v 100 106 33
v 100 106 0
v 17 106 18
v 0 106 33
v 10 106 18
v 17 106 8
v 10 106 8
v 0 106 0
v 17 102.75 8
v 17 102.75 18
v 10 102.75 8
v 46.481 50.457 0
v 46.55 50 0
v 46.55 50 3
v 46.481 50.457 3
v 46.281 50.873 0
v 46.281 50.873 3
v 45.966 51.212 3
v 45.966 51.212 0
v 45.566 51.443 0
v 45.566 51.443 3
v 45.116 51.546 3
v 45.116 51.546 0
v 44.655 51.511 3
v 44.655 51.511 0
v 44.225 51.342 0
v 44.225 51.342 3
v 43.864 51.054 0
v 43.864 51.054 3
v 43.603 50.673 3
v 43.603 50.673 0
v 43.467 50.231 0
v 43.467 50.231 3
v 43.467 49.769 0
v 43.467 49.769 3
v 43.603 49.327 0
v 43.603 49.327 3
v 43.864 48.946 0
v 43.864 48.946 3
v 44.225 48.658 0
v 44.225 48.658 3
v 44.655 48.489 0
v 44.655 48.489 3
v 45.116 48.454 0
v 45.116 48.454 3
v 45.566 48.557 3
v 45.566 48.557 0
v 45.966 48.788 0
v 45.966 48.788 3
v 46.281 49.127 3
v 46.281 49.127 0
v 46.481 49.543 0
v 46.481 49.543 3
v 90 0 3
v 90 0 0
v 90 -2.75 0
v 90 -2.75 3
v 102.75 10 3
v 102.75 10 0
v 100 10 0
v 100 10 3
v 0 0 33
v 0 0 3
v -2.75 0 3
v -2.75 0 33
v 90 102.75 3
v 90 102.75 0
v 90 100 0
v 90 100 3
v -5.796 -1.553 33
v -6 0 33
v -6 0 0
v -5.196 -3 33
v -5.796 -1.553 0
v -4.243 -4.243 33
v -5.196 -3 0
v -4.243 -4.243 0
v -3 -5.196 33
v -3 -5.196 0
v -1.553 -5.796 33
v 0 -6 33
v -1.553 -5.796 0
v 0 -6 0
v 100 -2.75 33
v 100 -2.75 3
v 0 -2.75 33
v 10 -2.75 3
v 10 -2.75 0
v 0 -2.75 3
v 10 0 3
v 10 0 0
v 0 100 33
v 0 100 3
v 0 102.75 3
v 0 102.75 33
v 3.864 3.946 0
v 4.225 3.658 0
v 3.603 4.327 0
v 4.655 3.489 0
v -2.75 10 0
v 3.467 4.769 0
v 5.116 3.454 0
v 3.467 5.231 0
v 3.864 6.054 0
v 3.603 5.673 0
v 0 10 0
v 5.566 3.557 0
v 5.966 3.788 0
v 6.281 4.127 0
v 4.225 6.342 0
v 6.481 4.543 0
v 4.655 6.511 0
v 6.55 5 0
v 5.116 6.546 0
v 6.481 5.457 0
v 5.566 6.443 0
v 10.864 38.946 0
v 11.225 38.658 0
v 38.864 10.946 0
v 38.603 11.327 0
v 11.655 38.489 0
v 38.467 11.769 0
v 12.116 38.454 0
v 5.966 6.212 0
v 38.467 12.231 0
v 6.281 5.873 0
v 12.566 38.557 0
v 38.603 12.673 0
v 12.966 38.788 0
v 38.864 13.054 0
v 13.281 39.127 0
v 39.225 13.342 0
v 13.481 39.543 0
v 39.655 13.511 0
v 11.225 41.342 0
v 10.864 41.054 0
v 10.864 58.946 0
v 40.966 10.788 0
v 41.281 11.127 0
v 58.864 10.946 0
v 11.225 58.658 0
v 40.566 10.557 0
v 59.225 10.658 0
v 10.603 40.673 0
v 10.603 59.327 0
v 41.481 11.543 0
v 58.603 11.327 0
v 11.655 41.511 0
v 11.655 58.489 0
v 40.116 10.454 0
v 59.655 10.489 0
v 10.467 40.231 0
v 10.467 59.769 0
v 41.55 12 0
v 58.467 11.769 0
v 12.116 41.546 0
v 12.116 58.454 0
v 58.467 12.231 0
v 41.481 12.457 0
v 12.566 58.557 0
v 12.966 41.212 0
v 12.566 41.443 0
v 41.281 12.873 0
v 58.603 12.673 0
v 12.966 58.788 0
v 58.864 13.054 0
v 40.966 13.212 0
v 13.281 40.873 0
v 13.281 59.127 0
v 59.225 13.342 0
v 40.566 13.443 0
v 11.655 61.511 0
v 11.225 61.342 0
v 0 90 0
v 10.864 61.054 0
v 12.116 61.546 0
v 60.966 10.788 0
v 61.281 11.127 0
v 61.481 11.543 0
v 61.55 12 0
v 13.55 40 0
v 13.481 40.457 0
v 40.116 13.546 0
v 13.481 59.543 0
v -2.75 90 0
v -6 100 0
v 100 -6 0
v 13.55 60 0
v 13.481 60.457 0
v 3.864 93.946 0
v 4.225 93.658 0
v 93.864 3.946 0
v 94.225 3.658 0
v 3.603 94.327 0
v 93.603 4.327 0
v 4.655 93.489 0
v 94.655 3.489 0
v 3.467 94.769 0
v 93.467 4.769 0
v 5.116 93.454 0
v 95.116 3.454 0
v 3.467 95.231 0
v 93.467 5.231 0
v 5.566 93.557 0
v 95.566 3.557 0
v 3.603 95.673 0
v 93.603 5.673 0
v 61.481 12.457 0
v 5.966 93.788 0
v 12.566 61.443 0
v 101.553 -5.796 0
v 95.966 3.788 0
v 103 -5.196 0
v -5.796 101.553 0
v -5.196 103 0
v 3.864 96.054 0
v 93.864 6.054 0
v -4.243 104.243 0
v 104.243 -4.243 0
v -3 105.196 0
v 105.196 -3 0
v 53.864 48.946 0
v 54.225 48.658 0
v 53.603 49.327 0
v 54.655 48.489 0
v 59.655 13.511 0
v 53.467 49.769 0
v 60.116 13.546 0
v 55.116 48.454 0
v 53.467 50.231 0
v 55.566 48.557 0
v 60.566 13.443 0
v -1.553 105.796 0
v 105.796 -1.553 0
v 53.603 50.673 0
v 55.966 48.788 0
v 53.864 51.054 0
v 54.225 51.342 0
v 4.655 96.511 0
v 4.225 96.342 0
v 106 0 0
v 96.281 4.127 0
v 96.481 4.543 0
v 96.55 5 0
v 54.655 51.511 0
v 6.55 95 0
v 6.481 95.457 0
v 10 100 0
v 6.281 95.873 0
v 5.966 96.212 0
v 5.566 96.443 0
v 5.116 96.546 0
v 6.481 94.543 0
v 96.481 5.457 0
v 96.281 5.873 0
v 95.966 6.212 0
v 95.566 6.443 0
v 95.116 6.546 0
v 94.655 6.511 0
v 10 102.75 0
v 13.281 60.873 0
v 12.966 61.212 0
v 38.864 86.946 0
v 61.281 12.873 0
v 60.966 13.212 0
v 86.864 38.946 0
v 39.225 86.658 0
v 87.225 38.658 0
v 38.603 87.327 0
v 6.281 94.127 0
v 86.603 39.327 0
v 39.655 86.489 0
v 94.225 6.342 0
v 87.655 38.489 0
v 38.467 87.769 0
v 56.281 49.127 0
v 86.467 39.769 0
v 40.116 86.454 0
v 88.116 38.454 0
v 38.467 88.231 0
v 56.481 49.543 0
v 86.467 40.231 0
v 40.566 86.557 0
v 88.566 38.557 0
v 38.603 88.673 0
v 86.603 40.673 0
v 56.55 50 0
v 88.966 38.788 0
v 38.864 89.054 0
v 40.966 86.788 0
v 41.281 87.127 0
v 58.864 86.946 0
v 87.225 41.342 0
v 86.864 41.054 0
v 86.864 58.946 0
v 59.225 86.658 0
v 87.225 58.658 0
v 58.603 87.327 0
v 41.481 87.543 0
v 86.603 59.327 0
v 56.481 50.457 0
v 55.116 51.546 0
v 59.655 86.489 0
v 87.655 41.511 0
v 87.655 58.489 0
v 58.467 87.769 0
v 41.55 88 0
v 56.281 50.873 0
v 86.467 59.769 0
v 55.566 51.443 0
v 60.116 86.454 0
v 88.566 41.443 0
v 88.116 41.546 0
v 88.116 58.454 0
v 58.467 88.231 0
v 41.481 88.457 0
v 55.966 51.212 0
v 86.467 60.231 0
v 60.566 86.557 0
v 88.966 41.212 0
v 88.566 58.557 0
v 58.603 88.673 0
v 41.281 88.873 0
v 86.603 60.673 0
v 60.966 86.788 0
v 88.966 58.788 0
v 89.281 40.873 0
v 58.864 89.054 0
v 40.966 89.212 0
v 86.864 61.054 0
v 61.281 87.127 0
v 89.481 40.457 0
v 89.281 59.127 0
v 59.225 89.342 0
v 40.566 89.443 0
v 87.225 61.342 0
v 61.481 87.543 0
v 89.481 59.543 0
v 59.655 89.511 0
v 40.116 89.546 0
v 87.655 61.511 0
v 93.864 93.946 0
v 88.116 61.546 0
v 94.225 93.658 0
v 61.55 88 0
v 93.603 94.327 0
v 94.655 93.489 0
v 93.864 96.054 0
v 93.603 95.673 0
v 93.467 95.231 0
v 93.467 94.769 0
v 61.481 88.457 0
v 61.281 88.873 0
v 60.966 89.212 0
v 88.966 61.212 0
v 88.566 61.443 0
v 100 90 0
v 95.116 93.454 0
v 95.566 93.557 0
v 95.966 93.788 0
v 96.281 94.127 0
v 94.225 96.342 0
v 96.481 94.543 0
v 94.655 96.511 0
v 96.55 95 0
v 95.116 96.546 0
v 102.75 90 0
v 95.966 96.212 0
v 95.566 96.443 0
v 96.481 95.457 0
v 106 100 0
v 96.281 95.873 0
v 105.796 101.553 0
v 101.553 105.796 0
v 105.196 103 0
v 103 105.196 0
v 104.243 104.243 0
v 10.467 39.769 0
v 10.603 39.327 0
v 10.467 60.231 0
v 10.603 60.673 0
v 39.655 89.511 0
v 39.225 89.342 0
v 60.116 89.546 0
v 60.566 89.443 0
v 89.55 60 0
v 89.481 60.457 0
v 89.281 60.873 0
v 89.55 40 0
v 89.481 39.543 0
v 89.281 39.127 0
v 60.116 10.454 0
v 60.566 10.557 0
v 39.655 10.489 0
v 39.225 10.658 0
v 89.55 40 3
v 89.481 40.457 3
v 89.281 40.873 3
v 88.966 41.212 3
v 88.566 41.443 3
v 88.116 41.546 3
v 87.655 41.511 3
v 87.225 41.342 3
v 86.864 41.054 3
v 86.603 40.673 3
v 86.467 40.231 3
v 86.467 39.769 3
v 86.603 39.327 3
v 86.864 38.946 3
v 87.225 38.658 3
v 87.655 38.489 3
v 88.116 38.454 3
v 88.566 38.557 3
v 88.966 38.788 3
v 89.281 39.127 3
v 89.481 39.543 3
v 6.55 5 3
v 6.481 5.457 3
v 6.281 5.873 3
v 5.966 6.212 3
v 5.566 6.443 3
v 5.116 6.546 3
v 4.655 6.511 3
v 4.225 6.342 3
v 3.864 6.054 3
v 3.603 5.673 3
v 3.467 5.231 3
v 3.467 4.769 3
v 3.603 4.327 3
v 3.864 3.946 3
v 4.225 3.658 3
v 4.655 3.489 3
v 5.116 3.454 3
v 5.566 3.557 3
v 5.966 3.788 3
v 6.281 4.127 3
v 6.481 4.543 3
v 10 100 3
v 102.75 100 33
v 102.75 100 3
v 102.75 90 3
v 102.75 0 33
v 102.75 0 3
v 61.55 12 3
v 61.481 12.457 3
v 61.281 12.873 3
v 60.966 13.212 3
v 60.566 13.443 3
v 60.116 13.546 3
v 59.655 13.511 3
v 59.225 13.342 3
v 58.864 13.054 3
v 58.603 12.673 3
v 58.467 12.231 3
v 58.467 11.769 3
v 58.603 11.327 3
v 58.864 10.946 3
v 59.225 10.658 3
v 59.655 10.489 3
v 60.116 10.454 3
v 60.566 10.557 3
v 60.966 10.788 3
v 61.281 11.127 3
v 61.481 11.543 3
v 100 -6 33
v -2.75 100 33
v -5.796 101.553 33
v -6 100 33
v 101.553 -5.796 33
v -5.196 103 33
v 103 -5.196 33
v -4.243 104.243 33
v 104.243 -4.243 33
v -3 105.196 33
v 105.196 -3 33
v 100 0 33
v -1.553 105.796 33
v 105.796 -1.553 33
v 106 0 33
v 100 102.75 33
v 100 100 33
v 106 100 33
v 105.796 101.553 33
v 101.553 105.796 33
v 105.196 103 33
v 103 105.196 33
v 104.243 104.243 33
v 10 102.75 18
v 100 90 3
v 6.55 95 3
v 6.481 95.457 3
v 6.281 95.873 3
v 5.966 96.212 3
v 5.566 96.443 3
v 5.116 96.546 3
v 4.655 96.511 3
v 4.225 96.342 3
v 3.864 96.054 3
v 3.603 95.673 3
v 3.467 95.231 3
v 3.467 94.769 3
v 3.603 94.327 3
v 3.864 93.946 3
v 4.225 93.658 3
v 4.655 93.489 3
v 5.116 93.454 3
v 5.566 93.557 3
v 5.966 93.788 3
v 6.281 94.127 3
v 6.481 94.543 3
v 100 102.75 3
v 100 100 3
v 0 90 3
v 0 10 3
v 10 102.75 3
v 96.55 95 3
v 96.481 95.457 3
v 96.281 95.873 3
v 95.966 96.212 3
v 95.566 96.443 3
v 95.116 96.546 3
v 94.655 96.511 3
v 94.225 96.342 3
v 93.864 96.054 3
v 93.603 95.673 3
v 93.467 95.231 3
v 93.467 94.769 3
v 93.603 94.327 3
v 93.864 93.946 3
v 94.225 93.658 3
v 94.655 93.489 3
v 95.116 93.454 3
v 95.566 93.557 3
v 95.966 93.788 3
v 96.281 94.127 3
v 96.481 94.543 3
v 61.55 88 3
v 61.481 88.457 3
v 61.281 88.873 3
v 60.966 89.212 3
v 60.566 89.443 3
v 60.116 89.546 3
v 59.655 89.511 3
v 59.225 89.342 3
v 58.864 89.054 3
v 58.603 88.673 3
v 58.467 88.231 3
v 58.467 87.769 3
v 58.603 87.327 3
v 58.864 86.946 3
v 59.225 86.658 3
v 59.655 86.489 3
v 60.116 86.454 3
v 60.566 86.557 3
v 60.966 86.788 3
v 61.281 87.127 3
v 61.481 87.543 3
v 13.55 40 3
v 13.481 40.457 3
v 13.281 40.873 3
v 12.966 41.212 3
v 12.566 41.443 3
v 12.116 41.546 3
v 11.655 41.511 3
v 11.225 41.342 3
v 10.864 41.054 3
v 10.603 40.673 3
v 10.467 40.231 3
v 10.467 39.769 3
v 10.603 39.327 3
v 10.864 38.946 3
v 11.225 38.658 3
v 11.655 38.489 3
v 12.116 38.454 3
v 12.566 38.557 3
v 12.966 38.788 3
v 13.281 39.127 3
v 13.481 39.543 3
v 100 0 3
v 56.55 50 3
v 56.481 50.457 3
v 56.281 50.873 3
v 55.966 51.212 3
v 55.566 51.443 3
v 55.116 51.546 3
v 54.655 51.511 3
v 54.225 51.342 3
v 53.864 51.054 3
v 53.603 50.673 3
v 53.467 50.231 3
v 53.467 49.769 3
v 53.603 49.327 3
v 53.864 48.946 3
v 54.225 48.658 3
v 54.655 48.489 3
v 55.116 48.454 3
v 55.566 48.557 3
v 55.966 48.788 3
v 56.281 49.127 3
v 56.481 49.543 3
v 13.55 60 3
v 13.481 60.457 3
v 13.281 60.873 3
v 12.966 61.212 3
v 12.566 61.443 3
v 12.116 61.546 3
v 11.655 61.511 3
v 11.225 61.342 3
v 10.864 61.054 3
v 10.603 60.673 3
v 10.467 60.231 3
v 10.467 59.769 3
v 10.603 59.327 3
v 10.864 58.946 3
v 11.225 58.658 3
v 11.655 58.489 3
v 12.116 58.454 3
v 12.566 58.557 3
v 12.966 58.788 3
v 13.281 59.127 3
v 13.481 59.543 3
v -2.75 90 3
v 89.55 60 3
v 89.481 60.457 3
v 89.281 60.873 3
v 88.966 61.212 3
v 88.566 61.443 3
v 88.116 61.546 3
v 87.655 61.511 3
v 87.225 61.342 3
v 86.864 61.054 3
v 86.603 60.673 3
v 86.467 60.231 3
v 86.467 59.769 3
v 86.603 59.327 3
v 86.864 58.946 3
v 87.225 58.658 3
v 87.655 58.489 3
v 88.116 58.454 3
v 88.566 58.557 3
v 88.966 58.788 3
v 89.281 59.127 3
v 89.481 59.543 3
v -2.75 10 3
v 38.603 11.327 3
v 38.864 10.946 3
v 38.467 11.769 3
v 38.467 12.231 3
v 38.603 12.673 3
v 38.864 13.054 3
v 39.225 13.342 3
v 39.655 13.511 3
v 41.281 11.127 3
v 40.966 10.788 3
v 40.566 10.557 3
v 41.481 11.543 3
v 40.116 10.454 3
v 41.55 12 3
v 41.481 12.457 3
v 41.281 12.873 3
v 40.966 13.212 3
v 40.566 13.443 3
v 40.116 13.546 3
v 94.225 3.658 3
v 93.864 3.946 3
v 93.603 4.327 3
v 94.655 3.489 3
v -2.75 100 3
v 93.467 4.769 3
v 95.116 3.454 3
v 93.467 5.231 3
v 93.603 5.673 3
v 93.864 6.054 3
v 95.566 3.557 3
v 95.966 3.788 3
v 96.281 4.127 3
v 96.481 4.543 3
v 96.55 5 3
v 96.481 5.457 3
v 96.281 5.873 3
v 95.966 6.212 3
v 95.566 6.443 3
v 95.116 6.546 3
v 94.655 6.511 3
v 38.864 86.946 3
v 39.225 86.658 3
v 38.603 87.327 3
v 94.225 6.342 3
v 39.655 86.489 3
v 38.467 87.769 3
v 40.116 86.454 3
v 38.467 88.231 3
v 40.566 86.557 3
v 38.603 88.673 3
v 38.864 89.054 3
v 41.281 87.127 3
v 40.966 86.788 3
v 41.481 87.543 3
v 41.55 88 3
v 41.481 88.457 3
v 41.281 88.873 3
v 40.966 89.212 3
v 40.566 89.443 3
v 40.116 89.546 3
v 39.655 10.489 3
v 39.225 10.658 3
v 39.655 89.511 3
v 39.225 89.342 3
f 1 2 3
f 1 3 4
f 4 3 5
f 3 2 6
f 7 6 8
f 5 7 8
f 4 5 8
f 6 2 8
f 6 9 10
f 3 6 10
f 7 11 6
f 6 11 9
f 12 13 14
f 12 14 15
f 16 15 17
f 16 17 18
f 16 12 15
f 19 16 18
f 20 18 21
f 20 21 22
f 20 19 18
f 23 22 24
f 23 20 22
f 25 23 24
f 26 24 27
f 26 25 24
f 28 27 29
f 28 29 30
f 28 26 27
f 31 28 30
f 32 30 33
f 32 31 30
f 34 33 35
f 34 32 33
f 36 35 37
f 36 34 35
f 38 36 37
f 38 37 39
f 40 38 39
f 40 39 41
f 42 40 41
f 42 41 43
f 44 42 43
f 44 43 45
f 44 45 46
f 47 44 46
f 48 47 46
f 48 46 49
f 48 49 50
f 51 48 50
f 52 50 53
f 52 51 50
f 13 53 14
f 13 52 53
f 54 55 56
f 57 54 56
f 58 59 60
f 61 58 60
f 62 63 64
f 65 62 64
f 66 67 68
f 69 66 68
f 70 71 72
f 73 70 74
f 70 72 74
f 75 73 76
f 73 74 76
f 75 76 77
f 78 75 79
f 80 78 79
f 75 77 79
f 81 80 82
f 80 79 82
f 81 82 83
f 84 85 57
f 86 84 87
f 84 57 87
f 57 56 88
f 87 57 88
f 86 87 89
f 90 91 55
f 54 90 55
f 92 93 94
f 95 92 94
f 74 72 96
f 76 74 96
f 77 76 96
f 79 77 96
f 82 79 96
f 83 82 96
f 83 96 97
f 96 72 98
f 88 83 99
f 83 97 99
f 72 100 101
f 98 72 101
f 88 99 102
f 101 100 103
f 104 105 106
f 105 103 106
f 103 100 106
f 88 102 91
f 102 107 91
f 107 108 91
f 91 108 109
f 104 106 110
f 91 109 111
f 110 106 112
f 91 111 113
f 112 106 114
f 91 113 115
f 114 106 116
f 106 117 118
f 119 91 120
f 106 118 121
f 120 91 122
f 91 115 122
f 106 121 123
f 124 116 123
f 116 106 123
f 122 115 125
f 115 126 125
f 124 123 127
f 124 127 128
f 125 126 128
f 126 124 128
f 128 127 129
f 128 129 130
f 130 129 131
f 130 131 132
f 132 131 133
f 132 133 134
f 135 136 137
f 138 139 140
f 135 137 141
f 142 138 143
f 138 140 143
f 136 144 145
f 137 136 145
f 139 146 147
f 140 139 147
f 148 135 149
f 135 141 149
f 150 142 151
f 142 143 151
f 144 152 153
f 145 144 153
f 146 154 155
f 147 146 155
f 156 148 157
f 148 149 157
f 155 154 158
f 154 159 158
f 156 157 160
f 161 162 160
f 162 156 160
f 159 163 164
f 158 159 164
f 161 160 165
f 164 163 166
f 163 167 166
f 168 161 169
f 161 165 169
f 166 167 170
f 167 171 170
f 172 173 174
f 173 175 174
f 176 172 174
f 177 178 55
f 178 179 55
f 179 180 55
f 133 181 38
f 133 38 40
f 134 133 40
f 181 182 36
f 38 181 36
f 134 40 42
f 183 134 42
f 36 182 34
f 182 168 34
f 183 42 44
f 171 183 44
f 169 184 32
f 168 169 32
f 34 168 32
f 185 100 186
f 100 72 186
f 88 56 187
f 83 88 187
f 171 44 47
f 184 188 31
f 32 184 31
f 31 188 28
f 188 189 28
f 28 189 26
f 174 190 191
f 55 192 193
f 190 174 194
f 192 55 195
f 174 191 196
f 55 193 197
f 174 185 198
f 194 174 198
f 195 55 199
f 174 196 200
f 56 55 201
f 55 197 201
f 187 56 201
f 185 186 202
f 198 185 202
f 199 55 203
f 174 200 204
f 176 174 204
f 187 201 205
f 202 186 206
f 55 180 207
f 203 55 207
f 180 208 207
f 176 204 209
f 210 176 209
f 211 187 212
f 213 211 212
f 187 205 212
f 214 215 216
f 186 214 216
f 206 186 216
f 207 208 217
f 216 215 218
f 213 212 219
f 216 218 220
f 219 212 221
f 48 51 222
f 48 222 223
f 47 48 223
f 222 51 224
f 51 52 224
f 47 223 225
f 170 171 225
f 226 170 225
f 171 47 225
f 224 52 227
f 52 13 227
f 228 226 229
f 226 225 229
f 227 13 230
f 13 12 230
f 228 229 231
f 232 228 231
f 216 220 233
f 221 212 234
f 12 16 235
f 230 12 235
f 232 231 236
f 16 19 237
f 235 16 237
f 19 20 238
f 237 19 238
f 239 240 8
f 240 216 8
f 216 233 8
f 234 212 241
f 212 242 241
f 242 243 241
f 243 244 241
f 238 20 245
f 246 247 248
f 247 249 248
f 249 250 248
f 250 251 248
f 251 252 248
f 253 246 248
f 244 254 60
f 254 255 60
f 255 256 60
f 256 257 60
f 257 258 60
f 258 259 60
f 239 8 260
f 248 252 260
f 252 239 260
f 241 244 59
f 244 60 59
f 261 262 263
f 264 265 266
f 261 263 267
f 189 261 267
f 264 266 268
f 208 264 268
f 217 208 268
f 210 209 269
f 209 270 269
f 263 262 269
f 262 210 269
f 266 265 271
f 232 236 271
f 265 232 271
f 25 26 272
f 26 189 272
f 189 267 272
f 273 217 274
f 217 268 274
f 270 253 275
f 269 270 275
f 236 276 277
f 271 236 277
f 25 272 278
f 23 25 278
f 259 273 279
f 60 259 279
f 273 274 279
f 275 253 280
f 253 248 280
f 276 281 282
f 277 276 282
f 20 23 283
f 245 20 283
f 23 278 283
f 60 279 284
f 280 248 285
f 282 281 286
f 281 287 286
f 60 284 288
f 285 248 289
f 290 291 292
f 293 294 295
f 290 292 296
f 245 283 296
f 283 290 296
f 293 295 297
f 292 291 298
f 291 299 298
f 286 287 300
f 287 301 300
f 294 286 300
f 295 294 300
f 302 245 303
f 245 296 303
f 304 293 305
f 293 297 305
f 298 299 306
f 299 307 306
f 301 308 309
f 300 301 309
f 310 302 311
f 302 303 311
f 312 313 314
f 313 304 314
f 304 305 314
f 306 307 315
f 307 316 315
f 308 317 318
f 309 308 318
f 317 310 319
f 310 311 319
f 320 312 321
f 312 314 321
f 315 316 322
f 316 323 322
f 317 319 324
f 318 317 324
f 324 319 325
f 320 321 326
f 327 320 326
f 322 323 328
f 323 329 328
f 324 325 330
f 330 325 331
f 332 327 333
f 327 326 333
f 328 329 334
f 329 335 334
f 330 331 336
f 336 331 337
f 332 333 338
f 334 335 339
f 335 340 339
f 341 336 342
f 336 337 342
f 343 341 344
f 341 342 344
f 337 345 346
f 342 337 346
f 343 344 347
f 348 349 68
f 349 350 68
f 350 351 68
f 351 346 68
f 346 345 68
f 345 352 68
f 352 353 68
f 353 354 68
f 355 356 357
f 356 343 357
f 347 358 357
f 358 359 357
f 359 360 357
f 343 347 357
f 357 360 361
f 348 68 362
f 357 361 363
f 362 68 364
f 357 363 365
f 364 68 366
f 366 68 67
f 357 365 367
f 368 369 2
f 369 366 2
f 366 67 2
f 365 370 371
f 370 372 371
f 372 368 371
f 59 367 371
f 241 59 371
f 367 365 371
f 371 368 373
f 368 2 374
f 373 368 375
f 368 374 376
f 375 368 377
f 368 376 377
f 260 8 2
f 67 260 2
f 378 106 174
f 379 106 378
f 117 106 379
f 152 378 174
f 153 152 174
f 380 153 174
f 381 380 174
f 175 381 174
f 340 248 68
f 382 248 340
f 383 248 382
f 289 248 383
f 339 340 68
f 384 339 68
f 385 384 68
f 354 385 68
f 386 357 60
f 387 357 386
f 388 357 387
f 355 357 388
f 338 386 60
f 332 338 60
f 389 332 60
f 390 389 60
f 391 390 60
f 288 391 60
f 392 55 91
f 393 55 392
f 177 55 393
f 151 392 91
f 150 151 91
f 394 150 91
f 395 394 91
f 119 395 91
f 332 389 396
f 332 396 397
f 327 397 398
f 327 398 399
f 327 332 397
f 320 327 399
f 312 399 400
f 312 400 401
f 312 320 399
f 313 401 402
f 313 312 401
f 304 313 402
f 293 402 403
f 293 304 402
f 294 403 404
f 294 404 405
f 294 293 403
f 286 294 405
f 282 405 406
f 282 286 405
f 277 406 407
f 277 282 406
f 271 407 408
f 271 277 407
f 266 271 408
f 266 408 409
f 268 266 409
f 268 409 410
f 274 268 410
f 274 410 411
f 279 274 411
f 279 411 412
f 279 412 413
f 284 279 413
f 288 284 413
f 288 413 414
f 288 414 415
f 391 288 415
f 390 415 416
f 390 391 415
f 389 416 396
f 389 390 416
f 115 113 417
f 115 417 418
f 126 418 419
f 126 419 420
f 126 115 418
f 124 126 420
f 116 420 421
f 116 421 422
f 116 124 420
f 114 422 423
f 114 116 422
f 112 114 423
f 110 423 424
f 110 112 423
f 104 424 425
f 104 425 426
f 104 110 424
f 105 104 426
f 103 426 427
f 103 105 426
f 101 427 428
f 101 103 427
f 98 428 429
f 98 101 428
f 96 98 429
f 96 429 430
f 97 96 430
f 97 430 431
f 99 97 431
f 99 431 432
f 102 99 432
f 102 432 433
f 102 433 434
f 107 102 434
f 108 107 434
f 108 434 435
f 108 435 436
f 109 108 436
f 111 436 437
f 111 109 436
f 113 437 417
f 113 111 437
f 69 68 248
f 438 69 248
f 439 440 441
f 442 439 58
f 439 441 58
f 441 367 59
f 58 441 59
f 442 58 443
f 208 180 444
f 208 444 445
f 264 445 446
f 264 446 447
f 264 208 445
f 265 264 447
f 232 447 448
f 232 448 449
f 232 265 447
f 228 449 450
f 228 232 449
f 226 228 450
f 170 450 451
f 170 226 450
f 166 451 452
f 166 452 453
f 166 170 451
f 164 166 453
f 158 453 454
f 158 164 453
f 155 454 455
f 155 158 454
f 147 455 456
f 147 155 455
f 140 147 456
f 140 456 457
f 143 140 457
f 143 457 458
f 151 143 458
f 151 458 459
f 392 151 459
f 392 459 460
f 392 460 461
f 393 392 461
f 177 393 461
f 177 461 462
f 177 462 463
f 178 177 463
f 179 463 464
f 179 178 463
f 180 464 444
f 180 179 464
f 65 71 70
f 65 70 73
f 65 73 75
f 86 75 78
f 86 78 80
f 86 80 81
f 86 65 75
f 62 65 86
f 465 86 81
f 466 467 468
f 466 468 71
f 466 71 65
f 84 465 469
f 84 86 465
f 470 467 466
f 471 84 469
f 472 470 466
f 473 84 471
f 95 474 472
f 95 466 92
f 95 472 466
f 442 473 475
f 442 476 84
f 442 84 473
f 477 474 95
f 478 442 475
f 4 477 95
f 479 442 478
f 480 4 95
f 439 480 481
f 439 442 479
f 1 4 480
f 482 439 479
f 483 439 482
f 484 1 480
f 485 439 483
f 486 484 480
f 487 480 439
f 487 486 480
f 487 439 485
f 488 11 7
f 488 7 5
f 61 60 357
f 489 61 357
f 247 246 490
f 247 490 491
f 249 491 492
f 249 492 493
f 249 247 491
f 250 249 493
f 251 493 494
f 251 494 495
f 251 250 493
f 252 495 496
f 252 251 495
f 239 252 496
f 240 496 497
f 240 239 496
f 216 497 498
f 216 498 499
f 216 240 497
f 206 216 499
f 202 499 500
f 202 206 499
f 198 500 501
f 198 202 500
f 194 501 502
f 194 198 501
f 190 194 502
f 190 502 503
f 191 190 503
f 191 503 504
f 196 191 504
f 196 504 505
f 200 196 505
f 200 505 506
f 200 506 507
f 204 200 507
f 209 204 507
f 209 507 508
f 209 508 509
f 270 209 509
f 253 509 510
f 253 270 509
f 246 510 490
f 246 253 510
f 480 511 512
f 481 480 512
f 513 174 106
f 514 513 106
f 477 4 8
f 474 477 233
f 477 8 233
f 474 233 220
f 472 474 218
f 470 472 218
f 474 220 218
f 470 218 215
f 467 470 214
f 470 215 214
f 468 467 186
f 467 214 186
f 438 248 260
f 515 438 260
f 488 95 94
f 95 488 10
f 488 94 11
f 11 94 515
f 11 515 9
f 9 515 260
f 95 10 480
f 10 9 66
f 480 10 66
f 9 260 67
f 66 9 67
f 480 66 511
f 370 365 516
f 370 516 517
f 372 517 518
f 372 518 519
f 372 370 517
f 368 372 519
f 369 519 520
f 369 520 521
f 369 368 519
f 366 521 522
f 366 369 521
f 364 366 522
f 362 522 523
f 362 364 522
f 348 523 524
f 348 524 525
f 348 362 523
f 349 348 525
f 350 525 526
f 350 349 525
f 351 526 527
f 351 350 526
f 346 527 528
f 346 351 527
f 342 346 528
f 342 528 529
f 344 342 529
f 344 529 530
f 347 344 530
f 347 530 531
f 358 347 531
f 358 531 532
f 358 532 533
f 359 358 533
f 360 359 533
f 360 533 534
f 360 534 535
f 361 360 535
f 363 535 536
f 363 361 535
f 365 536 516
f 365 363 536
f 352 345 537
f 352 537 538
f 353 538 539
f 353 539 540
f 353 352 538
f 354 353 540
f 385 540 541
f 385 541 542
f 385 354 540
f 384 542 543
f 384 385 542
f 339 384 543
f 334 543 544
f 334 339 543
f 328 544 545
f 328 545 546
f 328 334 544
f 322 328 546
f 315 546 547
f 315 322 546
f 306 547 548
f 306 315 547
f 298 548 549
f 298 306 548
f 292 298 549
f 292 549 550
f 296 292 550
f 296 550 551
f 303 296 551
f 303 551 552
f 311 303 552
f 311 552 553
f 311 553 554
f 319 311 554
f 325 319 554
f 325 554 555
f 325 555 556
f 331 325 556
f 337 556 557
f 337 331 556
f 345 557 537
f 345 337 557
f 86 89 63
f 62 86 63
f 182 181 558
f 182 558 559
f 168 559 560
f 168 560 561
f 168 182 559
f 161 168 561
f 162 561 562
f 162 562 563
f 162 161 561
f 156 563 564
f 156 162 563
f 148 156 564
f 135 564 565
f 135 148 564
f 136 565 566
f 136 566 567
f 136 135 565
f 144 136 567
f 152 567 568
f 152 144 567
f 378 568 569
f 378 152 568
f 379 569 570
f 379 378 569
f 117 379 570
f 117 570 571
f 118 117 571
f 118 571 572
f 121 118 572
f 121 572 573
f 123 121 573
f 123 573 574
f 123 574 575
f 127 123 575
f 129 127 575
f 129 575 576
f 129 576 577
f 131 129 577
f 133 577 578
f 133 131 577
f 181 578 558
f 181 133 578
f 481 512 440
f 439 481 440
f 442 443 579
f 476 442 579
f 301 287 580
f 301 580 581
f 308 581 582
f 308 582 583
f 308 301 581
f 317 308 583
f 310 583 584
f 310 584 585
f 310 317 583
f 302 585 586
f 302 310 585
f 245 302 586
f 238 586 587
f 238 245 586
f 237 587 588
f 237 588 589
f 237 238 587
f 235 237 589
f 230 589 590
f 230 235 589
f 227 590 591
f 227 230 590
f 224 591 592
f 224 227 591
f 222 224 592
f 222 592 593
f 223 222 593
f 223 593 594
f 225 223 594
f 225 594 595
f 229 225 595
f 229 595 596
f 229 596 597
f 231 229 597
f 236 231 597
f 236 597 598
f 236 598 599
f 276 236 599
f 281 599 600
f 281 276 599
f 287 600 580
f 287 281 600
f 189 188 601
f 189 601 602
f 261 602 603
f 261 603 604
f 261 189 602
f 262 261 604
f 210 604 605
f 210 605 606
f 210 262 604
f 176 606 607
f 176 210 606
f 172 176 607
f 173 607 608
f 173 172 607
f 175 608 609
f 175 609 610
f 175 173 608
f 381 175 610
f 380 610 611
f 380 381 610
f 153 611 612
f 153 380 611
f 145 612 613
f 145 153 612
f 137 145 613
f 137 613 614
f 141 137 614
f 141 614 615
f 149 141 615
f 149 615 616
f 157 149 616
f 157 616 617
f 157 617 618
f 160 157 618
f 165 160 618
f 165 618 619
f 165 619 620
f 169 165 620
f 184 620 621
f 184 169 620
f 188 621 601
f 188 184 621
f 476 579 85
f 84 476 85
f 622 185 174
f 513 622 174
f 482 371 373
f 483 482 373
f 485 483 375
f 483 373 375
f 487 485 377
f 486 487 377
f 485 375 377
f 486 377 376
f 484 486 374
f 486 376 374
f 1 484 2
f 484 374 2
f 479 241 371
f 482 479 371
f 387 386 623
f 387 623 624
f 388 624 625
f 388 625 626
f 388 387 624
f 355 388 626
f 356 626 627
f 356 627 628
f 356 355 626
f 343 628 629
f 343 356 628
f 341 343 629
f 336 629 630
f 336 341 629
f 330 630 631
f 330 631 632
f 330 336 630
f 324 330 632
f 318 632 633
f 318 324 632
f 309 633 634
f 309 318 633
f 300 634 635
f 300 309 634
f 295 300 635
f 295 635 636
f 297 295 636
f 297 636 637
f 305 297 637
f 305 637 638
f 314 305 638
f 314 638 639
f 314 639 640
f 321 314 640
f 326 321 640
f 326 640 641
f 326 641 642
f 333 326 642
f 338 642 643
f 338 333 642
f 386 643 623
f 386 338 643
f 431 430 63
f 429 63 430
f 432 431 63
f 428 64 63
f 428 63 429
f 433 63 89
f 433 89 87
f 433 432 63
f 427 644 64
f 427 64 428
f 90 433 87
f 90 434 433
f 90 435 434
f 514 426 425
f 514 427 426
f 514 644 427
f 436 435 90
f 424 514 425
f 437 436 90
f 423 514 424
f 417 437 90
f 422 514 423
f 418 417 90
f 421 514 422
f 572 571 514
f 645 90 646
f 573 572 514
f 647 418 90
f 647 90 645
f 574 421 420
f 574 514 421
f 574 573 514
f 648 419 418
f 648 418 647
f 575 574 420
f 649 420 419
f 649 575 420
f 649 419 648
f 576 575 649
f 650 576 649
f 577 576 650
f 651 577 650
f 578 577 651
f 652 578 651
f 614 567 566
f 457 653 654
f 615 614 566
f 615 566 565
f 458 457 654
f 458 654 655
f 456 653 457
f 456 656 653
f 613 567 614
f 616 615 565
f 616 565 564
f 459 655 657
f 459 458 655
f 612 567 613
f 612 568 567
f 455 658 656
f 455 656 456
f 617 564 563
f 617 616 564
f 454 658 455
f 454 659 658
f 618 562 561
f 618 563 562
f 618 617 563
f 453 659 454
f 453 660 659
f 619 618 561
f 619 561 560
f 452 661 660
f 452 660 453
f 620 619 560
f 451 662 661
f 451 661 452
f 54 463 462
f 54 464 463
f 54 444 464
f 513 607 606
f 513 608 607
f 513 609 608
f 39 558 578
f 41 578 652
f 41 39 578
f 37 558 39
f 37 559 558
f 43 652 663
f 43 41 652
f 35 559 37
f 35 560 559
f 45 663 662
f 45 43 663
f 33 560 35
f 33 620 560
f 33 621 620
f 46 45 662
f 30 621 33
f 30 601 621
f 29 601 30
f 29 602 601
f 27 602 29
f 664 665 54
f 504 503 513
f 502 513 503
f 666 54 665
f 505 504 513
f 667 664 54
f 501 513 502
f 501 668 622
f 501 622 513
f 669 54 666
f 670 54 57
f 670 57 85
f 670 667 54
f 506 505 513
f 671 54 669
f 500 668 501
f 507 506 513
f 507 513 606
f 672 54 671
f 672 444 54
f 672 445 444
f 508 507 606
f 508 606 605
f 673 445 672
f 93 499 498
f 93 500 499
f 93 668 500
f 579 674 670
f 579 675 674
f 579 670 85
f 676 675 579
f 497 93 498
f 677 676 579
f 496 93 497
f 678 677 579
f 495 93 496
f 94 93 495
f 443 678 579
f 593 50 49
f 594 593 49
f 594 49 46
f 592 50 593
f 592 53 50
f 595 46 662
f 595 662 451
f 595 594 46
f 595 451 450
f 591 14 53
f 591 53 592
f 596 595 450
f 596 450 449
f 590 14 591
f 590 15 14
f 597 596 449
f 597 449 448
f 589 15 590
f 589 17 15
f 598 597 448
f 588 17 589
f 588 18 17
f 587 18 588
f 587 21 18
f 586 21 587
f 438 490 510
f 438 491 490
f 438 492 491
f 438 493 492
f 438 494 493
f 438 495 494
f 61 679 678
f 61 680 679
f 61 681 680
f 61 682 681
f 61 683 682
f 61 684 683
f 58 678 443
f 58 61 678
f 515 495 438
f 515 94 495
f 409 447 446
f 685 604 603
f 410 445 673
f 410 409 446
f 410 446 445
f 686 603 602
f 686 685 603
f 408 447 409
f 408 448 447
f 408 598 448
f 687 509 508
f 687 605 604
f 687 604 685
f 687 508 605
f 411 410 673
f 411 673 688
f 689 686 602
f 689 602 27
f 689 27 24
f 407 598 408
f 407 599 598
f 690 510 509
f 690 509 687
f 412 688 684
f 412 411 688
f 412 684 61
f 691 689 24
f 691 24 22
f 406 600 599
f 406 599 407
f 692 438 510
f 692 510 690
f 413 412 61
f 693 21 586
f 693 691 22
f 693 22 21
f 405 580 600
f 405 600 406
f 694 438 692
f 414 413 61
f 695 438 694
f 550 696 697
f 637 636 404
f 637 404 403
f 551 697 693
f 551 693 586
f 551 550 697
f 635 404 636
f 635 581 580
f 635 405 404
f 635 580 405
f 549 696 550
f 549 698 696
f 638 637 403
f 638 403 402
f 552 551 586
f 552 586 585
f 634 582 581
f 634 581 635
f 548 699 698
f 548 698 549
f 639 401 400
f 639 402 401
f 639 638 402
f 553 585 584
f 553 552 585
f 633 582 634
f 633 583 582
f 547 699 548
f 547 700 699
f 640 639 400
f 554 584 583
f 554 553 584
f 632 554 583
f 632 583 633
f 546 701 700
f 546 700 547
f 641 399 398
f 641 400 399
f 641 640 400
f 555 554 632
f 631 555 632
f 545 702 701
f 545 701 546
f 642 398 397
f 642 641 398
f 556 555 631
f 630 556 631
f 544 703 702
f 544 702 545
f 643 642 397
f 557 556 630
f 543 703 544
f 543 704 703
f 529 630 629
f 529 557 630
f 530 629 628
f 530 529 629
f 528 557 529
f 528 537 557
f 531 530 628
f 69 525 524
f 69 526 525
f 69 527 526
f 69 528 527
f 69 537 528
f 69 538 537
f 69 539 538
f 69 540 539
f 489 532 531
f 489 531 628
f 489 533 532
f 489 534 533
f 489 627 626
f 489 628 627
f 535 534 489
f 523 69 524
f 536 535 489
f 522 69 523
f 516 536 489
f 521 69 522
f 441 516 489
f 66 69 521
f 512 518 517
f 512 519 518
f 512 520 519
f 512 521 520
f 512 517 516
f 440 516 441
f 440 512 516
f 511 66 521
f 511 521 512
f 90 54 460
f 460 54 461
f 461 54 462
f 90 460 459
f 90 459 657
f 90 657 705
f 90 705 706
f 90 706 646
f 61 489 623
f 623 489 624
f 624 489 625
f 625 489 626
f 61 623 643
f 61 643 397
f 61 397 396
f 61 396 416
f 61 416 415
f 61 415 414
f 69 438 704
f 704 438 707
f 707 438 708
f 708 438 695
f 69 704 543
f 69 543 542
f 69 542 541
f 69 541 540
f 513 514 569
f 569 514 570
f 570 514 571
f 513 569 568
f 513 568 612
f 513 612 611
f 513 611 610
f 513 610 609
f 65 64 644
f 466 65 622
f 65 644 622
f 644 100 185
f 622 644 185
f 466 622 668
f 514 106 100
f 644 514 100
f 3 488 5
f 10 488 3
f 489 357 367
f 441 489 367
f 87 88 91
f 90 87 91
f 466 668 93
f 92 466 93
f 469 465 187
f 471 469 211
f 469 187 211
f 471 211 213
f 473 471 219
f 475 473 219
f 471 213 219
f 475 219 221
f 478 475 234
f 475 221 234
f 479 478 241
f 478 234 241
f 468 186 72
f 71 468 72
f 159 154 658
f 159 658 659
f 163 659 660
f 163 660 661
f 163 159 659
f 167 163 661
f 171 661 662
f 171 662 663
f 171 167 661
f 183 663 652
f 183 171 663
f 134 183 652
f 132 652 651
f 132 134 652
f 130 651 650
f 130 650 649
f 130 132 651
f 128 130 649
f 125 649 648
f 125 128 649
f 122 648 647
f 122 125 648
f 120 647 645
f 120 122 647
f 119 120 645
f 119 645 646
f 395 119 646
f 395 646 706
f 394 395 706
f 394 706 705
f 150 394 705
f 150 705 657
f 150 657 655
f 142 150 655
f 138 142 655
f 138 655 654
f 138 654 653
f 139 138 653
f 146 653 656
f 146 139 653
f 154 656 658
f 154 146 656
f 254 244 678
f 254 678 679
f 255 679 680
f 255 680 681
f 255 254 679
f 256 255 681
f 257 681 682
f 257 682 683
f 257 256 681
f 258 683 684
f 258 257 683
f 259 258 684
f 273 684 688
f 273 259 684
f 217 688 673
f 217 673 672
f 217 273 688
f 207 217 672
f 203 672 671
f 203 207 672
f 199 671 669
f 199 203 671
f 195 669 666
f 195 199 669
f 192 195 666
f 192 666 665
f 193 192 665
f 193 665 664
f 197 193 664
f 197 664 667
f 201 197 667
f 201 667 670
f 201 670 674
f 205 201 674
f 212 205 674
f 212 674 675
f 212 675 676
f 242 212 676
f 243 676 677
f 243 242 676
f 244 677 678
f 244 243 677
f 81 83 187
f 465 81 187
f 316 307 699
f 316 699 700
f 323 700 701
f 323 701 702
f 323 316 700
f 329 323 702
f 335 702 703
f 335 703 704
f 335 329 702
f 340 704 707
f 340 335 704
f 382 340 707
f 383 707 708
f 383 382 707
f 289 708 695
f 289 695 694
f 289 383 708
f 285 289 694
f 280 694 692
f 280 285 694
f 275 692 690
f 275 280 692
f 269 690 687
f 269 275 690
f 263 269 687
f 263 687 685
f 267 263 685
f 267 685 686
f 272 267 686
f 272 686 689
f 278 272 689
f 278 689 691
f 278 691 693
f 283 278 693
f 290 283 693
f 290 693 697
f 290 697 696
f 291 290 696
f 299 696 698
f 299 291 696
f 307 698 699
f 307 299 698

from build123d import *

# Parameters (mm, degrees)
SKETCH_1_R          = 1.55
EXTRUDE_4_DEPTH     = 3
EXTRUDE_5_DEPTH     = 33
SKETCH_3_W          = 7
SKETCH_3_H          = 10
CUT_EXTRUDE_1_DEPTH = 6


with BuildPart() as part:
    # 草图1 → 凸台-拉伸4 (new body)
    with BuildSketch(Plane.XY):
        Polygon((0, 10), (-2.75, 10), (-2.75, 0), (0, 0), (0, -2.75), (10, -2.75), (10, 0), (50, 0), (90, 0), (90, -2.75), (100, -2.75), (100, 0), (102.75, 0), (102.75, 10), (100, 10), (100, 90), (102.75, 90), (102.75, 100), (100, 100), (100, 102.75), (90, 102.75), (90, 100), (50, 100), (10, 100), (10, 102.75), (0, 102.75), (0, 100), (-2.75, 100), (-2.75, 90), (0, 90), align=None)
        with Locations((45, 50)):
            Circle(SKETCH_1_R, mode=Mode.SUBTRACT)
        with Locations((55, 50)):
            Circle(SKETCH_1_R, mode=Mode.SUBTRACT)
        with Locations((5, 5)):
            Circle(SKETCH_1_R, mode=Mode.SUBTRACT)
        with Locations((95, 5)):
            Circle(SKETCH_1_R, mode=Mode.SUBTRACT)
        with Locations((40, 12)):
            Circle(SKETCH_1_R, mode=Mode.SUBTRACT)
        with Locations((60, 12)):
            Circle(SKETCH_1_R, mode=Mode.SUBTRACT)
        with Locations((95, 95)):
            Circle(SKETCH_1_R, mode=Mode.SUBTRACT)
        with Locations((5, 95)):
            Circle(SKETCH_1_R, mode=Mode.SUBTRACT)
        with Locations((12, 40)):
            Circle(SKETCH_1_R, mode=Mode.SUBTRACT)
        with Locations((88, 40)):
            Circle(SKETCH_1_R, mode=Mode.SUBTRACT)
        with Locations((88, 60)):
            Circle(SKETCH_1_R, mode=Mode.SUBTRACT)
        with Locations((12, 60)):
            Circle(SKETCH_1_R, mode=Mode.SUBTRACT)
        with Locations((40, 88)):
            Circle(SKETCH_1_R, mode=Mode.SUBTRACT)
        with Locations((60, 88)):
            Circle(SKETCH_1_R, mode=Mode.SUBTRACT)
    extrude(amount=EXTRUDE_4_DEPTH)

    # 草图1<8> → 凸台-拉伸5 (add)
    with BuildSketch(Plane.XY):
        with BuildLine():
            ThreePointArc((-6, 0), (-4.242640687, -4.242640687), (0, -6))
            Line((0, -6), (100, -6))
            ThreePointArc((100, -6), (104.242640687, -4.242640687), (106, 0))
            Line((106, 0), (106, 100))
            ThreePointArc((106, 100), (104.242640687, 104.242640687), (100, 106))
            Line((100, 106), (0, 106))
            ThreePointArc((0, 106), (-4.242640687, 104.242640687), (-6, 100))
            Line((-6, 100), (-6, 0))
        make_face()
        Polygon((0, -2.75), (0, 0), (-2.75, 0), (-2.75, 100), (0, 100), (0, 102.75), (100, 102.75), (100, 100), (102.75, 100), (102.75, 0), (100, 0), (100, -2.75), align=None, mode=Mode.SUBTRACT)
    extrude(amount=EXTRUDE_5_DEPTH)

    # 草图3 → 切除-拉伸1 (cut)
    with BuildSketch(Plane.XZ.offset(-102.75)):
        with Locations((13.5, 13)):
            Rectangle(SKETCH_3_W, SKETCH_3_H)
    extrude(amount=-CUT_EXTRUDE_1_DEPTH, mode=Mode.SUBTRACT)


solid = part.part
